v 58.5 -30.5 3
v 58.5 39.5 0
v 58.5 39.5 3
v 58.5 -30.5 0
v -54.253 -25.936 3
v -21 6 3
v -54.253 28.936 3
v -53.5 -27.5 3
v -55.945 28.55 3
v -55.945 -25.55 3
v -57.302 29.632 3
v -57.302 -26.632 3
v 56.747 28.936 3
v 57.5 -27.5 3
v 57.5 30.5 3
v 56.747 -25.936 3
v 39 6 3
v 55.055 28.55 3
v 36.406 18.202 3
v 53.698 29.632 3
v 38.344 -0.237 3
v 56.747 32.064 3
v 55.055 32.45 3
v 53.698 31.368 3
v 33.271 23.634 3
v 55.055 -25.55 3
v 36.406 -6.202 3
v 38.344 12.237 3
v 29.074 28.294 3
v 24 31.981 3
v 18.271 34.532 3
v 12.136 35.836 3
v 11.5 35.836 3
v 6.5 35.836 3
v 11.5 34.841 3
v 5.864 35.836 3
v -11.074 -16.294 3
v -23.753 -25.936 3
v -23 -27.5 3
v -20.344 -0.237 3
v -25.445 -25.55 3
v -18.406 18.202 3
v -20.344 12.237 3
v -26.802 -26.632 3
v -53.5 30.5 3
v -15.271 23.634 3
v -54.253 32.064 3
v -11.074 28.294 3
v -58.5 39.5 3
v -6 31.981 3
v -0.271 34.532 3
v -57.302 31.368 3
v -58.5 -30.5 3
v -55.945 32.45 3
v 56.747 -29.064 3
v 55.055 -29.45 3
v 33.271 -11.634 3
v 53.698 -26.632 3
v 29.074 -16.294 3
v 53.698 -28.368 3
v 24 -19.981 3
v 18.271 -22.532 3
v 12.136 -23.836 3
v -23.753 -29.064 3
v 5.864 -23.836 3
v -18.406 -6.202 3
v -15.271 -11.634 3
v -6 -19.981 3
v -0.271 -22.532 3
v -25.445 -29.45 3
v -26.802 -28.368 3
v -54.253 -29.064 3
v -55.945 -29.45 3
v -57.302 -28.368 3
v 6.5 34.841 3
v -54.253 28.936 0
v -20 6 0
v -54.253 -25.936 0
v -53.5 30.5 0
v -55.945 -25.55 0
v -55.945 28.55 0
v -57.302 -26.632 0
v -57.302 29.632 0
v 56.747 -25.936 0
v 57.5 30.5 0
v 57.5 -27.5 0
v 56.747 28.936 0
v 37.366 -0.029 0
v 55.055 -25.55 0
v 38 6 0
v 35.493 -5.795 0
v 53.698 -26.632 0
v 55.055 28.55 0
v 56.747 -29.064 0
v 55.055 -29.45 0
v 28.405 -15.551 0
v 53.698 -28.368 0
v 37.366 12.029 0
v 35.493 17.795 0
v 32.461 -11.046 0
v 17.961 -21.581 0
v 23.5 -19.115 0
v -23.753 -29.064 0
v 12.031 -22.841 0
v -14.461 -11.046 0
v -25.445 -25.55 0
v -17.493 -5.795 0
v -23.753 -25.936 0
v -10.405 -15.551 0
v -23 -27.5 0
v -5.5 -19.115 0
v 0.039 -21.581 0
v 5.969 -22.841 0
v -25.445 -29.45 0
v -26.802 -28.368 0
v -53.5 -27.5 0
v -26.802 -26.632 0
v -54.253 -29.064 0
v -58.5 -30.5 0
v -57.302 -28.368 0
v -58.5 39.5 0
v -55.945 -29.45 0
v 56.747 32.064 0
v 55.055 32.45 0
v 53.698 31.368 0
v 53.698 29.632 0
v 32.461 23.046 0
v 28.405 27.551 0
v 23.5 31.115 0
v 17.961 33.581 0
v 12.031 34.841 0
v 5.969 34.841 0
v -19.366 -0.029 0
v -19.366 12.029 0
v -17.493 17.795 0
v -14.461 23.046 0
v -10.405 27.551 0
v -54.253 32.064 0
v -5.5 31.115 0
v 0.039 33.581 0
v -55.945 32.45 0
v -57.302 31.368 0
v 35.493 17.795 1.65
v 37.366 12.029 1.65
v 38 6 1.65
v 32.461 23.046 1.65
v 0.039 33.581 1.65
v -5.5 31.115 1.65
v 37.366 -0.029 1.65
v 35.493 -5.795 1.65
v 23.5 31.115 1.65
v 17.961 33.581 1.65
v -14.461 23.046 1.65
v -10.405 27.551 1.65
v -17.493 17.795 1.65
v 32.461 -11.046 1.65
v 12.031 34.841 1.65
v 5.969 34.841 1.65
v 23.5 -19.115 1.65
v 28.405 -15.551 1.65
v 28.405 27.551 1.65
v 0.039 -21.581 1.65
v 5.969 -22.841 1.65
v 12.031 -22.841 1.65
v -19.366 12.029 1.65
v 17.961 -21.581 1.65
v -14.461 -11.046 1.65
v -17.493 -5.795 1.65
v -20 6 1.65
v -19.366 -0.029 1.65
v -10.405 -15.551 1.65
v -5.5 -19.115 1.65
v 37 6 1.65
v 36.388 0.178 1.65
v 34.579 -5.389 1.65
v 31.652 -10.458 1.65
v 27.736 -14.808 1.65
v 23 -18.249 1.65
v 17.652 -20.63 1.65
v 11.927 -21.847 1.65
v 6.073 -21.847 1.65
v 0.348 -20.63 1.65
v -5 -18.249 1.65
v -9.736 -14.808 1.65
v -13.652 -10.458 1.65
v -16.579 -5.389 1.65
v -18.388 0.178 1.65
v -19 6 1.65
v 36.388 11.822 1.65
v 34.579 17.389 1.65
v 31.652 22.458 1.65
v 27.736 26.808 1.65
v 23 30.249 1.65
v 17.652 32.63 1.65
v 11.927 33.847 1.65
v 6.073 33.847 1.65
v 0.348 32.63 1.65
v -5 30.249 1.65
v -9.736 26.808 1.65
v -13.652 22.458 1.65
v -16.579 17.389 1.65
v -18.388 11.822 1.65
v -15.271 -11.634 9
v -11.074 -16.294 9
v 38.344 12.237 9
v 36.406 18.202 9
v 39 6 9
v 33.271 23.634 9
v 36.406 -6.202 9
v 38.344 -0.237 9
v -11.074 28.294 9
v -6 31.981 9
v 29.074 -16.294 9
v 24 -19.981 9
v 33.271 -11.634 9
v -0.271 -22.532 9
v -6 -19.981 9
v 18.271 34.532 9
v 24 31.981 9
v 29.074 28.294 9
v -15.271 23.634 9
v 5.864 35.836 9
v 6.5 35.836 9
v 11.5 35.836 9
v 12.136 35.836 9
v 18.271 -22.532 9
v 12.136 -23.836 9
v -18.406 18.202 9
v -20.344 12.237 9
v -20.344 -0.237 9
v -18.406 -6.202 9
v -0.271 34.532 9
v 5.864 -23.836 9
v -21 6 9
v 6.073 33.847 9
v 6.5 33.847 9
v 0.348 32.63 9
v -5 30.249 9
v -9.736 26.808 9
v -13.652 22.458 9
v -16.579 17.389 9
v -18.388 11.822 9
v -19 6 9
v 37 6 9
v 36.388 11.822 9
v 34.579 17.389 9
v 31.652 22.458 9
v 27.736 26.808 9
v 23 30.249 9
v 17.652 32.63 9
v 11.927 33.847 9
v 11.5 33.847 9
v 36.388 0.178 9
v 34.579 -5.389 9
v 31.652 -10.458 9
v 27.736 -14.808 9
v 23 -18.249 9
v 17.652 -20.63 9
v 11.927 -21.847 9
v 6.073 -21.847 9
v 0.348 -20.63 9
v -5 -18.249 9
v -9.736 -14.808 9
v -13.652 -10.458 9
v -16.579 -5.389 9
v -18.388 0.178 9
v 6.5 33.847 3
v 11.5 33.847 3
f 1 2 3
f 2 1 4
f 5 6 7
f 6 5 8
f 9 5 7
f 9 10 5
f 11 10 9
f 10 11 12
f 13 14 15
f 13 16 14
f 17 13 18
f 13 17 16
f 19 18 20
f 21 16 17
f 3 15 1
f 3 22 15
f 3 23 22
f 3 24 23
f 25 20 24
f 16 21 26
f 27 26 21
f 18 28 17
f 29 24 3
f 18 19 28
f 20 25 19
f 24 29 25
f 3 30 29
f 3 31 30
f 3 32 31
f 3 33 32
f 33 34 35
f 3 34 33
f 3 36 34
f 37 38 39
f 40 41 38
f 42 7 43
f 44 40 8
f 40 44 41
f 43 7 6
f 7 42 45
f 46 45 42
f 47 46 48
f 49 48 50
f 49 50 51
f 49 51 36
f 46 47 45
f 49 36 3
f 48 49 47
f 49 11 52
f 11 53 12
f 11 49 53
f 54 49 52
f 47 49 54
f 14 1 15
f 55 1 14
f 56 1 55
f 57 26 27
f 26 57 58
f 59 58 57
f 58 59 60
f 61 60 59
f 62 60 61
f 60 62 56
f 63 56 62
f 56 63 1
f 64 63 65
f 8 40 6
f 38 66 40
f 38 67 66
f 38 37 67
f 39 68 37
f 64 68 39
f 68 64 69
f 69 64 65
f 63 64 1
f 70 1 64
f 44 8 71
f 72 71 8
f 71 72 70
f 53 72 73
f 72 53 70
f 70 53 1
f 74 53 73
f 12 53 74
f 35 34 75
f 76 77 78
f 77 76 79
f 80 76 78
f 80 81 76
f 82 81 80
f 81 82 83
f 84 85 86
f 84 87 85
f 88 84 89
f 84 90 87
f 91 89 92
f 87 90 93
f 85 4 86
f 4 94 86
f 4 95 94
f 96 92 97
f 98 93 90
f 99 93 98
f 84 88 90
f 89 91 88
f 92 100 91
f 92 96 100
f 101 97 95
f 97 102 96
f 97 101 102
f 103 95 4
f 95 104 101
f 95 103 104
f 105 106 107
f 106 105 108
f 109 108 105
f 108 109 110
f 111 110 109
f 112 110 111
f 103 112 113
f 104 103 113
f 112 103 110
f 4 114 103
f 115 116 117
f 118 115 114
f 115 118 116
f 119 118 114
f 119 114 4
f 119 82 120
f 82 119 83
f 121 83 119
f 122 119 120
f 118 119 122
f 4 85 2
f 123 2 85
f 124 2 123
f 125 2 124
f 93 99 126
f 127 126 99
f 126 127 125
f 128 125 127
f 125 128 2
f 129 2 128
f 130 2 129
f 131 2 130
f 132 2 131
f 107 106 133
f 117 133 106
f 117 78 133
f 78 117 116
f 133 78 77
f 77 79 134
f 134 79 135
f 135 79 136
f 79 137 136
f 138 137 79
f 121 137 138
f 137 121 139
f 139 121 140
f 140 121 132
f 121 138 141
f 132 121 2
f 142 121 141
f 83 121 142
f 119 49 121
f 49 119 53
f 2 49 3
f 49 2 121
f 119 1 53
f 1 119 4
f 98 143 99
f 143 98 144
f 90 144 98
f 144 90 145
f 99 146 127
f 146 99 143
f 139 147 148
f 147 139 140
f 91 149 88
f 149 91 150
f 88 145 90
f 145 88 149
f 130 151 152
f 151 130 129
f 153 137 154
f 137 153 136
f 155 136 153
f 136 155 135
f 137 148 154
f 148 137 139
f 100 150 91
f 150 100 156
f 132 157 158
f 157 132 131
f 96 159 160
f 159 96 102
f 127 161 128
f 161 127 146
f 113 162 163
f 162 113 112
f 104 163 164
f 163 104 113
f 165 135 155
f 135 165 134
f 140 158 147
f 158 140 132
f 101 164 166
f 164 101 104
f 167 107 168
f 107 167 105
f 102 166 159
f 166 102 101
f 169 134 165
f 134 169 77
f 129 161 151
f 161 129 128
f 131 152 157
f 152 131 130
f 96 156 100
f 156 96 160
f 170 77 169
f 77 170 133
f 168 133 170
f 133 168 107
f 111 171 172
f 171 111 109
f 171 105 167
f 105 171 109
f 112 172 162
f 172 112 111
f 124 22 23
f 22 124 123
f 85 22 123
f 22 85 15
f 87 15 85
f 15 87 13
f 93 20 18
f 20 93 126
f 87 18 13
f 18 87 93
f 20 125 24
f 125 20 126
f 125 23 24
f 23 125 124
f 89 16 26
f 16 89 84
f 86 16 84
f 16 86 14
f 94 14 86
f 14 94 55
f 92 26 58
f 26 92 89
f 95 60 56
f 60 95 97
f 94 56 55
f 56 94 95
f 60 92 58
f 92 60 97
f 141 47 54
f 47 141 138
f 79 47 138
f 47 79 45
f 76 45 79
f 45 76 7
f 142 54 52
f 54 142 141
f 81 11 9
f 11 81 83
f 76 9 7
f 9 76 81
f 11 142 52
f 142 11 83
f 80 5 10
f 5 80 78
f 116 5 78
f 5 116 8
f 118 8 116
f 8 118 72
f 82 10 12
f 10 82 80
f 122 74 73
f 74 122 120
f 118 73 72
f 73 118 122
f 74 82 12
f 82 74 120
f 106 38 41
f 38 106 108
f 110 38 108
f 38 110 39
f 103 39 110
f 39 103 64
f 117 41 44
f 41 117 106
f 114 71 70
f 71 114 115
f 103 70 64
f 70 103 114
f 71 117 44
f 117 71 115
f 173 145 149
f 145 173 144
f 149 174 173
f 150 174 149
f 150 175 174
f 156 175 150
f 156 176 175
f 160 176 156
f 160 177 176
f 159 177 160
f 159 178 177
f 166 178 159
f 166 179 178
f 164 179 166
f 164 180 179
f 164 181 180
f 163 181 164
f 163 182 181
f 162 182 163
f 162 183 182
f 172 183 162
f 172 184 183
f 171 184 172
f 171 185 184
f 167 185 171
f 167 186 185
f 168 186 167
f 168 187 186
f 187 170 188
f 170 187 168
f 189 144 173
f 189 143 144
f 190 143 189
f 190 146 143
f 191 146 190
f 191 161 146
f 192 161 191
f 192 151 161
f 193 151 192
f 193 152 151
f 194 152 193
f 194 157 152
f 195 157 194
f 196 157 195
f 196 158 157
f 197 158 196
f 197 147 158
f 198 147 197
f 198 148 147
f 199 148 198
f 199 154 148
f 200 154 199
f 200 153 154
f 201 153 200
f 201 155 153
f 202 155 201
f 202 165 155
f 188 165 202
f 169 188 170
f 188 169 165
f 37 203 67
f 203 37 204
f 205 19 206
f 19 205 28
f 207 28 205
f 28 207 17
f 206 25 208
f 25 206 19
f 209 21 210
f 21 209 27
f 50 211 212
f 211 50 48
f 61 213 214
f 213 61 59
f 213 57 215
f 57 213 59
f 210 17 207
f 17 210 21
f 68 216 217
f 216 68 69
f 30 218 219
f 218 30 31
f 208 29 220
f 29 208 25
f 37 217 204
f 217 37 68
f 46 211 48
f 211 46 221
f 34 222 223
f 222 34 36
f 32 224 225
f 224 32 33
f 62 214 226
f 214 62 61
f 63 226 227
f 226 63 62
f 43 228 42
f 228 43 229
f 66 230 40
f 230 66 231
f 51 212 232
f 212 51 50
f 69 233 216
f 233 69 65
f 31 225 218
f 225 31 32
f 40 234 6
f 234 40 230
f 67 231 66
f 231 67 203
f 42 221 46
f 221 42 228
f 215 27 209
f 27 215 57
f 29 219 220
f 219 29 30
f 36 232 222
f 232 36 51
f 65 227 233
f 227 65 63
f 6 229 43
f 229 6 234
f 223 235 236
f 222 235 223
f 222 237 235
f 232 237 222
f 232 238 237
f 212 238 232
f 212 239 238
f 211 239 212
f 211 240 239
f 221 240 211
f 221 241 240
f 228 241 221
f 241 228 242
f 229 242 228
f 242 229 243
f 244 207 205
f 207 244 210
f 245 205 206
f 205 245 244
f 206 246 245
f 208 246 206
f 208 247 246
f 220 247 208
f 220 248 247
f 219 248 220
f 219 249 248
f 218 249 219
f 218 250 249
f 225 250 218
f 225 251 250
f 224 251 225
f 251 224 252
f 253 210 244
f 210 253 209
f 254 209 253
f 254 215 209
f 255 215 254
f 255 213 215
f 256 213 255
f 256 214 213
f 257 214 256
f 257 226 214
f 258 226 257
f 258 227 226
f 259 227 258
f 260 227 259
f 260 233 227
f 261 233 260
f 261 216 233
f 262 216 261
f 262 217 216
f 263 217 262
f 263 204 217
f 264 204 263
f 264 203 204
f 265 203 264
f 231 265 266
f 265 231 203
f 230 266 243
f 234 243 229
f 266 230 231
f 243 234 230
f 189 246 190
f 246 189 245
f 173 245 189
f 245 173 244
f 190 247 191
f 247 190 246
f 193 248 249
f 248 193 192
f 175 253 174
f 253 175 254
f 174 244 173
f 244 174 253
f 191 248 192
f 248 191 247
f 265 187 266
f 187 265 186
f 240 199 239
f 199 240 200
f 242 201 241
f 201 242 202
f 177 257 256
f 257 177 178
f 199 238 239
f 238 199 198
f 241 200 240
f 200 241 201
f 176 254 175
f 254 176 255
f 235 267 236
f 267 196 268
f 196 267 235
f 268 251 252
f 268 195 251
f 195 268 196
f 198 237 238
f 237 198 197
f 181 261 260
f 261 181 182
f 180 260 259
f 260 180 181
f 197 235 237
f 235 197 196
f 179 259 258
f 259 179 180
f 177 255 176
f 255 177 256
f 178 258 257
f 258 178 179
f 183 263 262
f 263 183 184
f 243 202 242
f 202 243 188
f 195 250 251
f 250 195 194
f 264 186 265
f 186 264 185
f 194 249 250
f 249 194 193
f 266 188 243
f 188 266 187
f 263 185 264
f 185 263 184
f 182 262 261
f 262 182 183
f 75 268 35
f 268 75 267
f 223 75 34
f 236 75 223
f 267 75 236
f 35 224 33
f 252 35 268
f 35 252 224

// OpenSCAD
// file: settingsLenghts.scad
//Ancho de la pared
pared  = 2;
//Radio del centro hueco
radioC = 11;
//Alto de la capa de apertura
aperH = 5.5;
//Ancho de la apertura
aperW = 5+1.1;//Ancho mas holgura
//Ancho del lente macro
macroW = 9.3;
//Profundidad del macro
macroH = 3;
//Profundidad parte de atras y delante
profDelante = 6;
profAtras = 6;
//Ceja entre uniones de cilindros
cejaH = 6;
guiaParedW = 2;
tmpHolg = 1.8;


//Correcc

//
//CÁMARA
camP = 3;//Grueso de la pared del presente modelo
camW = 105;//Ancho de la cámara
camH = 61;//Alto de la cámara
camD = 23.5;//Profundidad de la cámara
camHlg = 6;//Holgura que se deja para los tornillos
camLW = 57/2;//Radio del exterior del lente
torW  = 2;//Radio

//
//Ancho de tubo principal (grande)
mcW = 32;//radio
mcH = 28;

//Dimensiones del difractador
diffW = 51;//Alto y Ancho
diffD=1;//Profundidad del difractador
diffWinW=36;//Ancho de la ventana de difracción
diffWinH=24;//Alto de la ventana de difracción

//
//Adquisición de luz
luzHBig = 10; //donde va el tornillo
luzWBig = 28; //27:diametro donde va el tornillo
luzHBigT = 4; //alto del tornillo
luzWBigT = 6; //6: ancho del tornillo
luzHRosca = 7; //donde va la rosca
luzWRosca = 23; //22:diametro de donde va la rosca



//Cuadro guia para que no se mueva
guiaH = cejaH;
guiaW = 3;



module creaPared(h){
	difference(){
		//Pone el cilindro principal
		cylinder(r=mcW,h);

		//Le quita el contorno exterior
		translate([0,0,-0.1])
		cylinder(r=mcW-pared,h+0.2);
	}
}
module creaGuiaTornilloCentrada(){
	translate([-luzWBigT/2,-luzWBigT/2,0])
	cube([luzWBigT,luzWBigT,luzHBig-1+0.2]);
}
module creaGuiaTornilloCentradaArea(){
	tmpW = luzWBigT + pared;
	tmpH = luzHBig  + pared;
	translate([-tmpW/2,-tmpW/2,0])
	cube([tmpW,tmpW,tmpH]);
}
module creaGuia(h){
	//Pone el circulo soporte
	difference(){
		cylinder(r=mcW,h);
		translate([0,0,-0.1])
		cylinder(r=mcW-pared,h+0.2);
	}
	//Pone la guia1
	translate([0,mcW-pared-(guiaW/2)+0.4,0])
	creaGuiaCentrada(h);
}
module creaGuiaHembra(h){
	//Pone el circulo soporte
	tmpW = mcW-guiaW;	
	creaPared(sopH);
	sopH = 1.35;
	
	//Pone la pared de la guia
	difference(){
		cylinder(r=(mcW-pared),sopH+h);
		translate([0,0,-0.1])
		cylinder(r=(mcW-pared-guiaParedW),sopH+h+0.2);
		//Pone la guia
		translate([-(guiaW/3),tmpW,sopH])
		creaGuiaCentrada(sopH+h+0.2);
		translate([(guiaW/3),tmpW,sopH])
		creaGuiaCentrada(sopH+h+0.2);
	}
}
module creaGuiaCentrada(h){
	translate([-guiaW/2,-guiaW/2,0])
	cube([guiaW,guiaW,h]);
}
// main file
include <settingsLenghts.scad>


camXLen = camW+camHlg*2;//Dist. nec. para poner lente en orilla der.
lenLen2R = 15;//Distancia entre el lado derecho y orilla del lente
lenXPos = (camXLen/2)-camLW-camHlg-lenLen2R;//Pos centro final lente

difference(){
	
	//translate([-(camW/2),-(camH/2)+camHlg,0])
	//cube([camW,camH,camP]);

	//Pone la base de la cámara	
	translate([-camXLen/2,-camH/2,0])
	cube([camW+(camHlg*2),camH+camHlg+3,camP]);
	
	//Quita el área donde entra la cámara
	translate([lenXPos,camHlg,-0.1])
	cylinder(r=camLW+0.5,camP+0.2);

	//Tornillo sup. der.
	translate([(camW/2)+(camHlg/2),(camH/2),-0.1])
	cylinder(r=torW,camP+0.2);

	//Tornillo inf. der.
	translate([(camW/2)+(camHlg/2),-((camH/2)-(camHlg/2)),-0.1])
	cylinder(r=torW,camP+0.2);

	//Tornillo sup. izq.
	translate([-(camW/2)-(camHlg/2),(camH/2),-0.1])
	cylinder(r=torW,camP+0.2);

	//Tornillo inf. izq.
	translate([-(camW/2)-(camHlg/2),-(camH/2)+(camHlg/2),-0.1])
	cylinder(r=torW,camP+0.2);

	//Tornillo sup. cent.
	//translate([-25,(camH/2),-0.1])
	//cylinder(r=torW,camP+0.2);

	//Tornillo inf. cent.
	translate([-25,-(camH/2)+(camHlg/2),-0.1])
	cylinder(r=torW,camP+0.2);
	
}

//Pone la guia hembra
translate([lenXPos,camHlg,camP-1.35])
creaGuiaHembra(cejaH);
